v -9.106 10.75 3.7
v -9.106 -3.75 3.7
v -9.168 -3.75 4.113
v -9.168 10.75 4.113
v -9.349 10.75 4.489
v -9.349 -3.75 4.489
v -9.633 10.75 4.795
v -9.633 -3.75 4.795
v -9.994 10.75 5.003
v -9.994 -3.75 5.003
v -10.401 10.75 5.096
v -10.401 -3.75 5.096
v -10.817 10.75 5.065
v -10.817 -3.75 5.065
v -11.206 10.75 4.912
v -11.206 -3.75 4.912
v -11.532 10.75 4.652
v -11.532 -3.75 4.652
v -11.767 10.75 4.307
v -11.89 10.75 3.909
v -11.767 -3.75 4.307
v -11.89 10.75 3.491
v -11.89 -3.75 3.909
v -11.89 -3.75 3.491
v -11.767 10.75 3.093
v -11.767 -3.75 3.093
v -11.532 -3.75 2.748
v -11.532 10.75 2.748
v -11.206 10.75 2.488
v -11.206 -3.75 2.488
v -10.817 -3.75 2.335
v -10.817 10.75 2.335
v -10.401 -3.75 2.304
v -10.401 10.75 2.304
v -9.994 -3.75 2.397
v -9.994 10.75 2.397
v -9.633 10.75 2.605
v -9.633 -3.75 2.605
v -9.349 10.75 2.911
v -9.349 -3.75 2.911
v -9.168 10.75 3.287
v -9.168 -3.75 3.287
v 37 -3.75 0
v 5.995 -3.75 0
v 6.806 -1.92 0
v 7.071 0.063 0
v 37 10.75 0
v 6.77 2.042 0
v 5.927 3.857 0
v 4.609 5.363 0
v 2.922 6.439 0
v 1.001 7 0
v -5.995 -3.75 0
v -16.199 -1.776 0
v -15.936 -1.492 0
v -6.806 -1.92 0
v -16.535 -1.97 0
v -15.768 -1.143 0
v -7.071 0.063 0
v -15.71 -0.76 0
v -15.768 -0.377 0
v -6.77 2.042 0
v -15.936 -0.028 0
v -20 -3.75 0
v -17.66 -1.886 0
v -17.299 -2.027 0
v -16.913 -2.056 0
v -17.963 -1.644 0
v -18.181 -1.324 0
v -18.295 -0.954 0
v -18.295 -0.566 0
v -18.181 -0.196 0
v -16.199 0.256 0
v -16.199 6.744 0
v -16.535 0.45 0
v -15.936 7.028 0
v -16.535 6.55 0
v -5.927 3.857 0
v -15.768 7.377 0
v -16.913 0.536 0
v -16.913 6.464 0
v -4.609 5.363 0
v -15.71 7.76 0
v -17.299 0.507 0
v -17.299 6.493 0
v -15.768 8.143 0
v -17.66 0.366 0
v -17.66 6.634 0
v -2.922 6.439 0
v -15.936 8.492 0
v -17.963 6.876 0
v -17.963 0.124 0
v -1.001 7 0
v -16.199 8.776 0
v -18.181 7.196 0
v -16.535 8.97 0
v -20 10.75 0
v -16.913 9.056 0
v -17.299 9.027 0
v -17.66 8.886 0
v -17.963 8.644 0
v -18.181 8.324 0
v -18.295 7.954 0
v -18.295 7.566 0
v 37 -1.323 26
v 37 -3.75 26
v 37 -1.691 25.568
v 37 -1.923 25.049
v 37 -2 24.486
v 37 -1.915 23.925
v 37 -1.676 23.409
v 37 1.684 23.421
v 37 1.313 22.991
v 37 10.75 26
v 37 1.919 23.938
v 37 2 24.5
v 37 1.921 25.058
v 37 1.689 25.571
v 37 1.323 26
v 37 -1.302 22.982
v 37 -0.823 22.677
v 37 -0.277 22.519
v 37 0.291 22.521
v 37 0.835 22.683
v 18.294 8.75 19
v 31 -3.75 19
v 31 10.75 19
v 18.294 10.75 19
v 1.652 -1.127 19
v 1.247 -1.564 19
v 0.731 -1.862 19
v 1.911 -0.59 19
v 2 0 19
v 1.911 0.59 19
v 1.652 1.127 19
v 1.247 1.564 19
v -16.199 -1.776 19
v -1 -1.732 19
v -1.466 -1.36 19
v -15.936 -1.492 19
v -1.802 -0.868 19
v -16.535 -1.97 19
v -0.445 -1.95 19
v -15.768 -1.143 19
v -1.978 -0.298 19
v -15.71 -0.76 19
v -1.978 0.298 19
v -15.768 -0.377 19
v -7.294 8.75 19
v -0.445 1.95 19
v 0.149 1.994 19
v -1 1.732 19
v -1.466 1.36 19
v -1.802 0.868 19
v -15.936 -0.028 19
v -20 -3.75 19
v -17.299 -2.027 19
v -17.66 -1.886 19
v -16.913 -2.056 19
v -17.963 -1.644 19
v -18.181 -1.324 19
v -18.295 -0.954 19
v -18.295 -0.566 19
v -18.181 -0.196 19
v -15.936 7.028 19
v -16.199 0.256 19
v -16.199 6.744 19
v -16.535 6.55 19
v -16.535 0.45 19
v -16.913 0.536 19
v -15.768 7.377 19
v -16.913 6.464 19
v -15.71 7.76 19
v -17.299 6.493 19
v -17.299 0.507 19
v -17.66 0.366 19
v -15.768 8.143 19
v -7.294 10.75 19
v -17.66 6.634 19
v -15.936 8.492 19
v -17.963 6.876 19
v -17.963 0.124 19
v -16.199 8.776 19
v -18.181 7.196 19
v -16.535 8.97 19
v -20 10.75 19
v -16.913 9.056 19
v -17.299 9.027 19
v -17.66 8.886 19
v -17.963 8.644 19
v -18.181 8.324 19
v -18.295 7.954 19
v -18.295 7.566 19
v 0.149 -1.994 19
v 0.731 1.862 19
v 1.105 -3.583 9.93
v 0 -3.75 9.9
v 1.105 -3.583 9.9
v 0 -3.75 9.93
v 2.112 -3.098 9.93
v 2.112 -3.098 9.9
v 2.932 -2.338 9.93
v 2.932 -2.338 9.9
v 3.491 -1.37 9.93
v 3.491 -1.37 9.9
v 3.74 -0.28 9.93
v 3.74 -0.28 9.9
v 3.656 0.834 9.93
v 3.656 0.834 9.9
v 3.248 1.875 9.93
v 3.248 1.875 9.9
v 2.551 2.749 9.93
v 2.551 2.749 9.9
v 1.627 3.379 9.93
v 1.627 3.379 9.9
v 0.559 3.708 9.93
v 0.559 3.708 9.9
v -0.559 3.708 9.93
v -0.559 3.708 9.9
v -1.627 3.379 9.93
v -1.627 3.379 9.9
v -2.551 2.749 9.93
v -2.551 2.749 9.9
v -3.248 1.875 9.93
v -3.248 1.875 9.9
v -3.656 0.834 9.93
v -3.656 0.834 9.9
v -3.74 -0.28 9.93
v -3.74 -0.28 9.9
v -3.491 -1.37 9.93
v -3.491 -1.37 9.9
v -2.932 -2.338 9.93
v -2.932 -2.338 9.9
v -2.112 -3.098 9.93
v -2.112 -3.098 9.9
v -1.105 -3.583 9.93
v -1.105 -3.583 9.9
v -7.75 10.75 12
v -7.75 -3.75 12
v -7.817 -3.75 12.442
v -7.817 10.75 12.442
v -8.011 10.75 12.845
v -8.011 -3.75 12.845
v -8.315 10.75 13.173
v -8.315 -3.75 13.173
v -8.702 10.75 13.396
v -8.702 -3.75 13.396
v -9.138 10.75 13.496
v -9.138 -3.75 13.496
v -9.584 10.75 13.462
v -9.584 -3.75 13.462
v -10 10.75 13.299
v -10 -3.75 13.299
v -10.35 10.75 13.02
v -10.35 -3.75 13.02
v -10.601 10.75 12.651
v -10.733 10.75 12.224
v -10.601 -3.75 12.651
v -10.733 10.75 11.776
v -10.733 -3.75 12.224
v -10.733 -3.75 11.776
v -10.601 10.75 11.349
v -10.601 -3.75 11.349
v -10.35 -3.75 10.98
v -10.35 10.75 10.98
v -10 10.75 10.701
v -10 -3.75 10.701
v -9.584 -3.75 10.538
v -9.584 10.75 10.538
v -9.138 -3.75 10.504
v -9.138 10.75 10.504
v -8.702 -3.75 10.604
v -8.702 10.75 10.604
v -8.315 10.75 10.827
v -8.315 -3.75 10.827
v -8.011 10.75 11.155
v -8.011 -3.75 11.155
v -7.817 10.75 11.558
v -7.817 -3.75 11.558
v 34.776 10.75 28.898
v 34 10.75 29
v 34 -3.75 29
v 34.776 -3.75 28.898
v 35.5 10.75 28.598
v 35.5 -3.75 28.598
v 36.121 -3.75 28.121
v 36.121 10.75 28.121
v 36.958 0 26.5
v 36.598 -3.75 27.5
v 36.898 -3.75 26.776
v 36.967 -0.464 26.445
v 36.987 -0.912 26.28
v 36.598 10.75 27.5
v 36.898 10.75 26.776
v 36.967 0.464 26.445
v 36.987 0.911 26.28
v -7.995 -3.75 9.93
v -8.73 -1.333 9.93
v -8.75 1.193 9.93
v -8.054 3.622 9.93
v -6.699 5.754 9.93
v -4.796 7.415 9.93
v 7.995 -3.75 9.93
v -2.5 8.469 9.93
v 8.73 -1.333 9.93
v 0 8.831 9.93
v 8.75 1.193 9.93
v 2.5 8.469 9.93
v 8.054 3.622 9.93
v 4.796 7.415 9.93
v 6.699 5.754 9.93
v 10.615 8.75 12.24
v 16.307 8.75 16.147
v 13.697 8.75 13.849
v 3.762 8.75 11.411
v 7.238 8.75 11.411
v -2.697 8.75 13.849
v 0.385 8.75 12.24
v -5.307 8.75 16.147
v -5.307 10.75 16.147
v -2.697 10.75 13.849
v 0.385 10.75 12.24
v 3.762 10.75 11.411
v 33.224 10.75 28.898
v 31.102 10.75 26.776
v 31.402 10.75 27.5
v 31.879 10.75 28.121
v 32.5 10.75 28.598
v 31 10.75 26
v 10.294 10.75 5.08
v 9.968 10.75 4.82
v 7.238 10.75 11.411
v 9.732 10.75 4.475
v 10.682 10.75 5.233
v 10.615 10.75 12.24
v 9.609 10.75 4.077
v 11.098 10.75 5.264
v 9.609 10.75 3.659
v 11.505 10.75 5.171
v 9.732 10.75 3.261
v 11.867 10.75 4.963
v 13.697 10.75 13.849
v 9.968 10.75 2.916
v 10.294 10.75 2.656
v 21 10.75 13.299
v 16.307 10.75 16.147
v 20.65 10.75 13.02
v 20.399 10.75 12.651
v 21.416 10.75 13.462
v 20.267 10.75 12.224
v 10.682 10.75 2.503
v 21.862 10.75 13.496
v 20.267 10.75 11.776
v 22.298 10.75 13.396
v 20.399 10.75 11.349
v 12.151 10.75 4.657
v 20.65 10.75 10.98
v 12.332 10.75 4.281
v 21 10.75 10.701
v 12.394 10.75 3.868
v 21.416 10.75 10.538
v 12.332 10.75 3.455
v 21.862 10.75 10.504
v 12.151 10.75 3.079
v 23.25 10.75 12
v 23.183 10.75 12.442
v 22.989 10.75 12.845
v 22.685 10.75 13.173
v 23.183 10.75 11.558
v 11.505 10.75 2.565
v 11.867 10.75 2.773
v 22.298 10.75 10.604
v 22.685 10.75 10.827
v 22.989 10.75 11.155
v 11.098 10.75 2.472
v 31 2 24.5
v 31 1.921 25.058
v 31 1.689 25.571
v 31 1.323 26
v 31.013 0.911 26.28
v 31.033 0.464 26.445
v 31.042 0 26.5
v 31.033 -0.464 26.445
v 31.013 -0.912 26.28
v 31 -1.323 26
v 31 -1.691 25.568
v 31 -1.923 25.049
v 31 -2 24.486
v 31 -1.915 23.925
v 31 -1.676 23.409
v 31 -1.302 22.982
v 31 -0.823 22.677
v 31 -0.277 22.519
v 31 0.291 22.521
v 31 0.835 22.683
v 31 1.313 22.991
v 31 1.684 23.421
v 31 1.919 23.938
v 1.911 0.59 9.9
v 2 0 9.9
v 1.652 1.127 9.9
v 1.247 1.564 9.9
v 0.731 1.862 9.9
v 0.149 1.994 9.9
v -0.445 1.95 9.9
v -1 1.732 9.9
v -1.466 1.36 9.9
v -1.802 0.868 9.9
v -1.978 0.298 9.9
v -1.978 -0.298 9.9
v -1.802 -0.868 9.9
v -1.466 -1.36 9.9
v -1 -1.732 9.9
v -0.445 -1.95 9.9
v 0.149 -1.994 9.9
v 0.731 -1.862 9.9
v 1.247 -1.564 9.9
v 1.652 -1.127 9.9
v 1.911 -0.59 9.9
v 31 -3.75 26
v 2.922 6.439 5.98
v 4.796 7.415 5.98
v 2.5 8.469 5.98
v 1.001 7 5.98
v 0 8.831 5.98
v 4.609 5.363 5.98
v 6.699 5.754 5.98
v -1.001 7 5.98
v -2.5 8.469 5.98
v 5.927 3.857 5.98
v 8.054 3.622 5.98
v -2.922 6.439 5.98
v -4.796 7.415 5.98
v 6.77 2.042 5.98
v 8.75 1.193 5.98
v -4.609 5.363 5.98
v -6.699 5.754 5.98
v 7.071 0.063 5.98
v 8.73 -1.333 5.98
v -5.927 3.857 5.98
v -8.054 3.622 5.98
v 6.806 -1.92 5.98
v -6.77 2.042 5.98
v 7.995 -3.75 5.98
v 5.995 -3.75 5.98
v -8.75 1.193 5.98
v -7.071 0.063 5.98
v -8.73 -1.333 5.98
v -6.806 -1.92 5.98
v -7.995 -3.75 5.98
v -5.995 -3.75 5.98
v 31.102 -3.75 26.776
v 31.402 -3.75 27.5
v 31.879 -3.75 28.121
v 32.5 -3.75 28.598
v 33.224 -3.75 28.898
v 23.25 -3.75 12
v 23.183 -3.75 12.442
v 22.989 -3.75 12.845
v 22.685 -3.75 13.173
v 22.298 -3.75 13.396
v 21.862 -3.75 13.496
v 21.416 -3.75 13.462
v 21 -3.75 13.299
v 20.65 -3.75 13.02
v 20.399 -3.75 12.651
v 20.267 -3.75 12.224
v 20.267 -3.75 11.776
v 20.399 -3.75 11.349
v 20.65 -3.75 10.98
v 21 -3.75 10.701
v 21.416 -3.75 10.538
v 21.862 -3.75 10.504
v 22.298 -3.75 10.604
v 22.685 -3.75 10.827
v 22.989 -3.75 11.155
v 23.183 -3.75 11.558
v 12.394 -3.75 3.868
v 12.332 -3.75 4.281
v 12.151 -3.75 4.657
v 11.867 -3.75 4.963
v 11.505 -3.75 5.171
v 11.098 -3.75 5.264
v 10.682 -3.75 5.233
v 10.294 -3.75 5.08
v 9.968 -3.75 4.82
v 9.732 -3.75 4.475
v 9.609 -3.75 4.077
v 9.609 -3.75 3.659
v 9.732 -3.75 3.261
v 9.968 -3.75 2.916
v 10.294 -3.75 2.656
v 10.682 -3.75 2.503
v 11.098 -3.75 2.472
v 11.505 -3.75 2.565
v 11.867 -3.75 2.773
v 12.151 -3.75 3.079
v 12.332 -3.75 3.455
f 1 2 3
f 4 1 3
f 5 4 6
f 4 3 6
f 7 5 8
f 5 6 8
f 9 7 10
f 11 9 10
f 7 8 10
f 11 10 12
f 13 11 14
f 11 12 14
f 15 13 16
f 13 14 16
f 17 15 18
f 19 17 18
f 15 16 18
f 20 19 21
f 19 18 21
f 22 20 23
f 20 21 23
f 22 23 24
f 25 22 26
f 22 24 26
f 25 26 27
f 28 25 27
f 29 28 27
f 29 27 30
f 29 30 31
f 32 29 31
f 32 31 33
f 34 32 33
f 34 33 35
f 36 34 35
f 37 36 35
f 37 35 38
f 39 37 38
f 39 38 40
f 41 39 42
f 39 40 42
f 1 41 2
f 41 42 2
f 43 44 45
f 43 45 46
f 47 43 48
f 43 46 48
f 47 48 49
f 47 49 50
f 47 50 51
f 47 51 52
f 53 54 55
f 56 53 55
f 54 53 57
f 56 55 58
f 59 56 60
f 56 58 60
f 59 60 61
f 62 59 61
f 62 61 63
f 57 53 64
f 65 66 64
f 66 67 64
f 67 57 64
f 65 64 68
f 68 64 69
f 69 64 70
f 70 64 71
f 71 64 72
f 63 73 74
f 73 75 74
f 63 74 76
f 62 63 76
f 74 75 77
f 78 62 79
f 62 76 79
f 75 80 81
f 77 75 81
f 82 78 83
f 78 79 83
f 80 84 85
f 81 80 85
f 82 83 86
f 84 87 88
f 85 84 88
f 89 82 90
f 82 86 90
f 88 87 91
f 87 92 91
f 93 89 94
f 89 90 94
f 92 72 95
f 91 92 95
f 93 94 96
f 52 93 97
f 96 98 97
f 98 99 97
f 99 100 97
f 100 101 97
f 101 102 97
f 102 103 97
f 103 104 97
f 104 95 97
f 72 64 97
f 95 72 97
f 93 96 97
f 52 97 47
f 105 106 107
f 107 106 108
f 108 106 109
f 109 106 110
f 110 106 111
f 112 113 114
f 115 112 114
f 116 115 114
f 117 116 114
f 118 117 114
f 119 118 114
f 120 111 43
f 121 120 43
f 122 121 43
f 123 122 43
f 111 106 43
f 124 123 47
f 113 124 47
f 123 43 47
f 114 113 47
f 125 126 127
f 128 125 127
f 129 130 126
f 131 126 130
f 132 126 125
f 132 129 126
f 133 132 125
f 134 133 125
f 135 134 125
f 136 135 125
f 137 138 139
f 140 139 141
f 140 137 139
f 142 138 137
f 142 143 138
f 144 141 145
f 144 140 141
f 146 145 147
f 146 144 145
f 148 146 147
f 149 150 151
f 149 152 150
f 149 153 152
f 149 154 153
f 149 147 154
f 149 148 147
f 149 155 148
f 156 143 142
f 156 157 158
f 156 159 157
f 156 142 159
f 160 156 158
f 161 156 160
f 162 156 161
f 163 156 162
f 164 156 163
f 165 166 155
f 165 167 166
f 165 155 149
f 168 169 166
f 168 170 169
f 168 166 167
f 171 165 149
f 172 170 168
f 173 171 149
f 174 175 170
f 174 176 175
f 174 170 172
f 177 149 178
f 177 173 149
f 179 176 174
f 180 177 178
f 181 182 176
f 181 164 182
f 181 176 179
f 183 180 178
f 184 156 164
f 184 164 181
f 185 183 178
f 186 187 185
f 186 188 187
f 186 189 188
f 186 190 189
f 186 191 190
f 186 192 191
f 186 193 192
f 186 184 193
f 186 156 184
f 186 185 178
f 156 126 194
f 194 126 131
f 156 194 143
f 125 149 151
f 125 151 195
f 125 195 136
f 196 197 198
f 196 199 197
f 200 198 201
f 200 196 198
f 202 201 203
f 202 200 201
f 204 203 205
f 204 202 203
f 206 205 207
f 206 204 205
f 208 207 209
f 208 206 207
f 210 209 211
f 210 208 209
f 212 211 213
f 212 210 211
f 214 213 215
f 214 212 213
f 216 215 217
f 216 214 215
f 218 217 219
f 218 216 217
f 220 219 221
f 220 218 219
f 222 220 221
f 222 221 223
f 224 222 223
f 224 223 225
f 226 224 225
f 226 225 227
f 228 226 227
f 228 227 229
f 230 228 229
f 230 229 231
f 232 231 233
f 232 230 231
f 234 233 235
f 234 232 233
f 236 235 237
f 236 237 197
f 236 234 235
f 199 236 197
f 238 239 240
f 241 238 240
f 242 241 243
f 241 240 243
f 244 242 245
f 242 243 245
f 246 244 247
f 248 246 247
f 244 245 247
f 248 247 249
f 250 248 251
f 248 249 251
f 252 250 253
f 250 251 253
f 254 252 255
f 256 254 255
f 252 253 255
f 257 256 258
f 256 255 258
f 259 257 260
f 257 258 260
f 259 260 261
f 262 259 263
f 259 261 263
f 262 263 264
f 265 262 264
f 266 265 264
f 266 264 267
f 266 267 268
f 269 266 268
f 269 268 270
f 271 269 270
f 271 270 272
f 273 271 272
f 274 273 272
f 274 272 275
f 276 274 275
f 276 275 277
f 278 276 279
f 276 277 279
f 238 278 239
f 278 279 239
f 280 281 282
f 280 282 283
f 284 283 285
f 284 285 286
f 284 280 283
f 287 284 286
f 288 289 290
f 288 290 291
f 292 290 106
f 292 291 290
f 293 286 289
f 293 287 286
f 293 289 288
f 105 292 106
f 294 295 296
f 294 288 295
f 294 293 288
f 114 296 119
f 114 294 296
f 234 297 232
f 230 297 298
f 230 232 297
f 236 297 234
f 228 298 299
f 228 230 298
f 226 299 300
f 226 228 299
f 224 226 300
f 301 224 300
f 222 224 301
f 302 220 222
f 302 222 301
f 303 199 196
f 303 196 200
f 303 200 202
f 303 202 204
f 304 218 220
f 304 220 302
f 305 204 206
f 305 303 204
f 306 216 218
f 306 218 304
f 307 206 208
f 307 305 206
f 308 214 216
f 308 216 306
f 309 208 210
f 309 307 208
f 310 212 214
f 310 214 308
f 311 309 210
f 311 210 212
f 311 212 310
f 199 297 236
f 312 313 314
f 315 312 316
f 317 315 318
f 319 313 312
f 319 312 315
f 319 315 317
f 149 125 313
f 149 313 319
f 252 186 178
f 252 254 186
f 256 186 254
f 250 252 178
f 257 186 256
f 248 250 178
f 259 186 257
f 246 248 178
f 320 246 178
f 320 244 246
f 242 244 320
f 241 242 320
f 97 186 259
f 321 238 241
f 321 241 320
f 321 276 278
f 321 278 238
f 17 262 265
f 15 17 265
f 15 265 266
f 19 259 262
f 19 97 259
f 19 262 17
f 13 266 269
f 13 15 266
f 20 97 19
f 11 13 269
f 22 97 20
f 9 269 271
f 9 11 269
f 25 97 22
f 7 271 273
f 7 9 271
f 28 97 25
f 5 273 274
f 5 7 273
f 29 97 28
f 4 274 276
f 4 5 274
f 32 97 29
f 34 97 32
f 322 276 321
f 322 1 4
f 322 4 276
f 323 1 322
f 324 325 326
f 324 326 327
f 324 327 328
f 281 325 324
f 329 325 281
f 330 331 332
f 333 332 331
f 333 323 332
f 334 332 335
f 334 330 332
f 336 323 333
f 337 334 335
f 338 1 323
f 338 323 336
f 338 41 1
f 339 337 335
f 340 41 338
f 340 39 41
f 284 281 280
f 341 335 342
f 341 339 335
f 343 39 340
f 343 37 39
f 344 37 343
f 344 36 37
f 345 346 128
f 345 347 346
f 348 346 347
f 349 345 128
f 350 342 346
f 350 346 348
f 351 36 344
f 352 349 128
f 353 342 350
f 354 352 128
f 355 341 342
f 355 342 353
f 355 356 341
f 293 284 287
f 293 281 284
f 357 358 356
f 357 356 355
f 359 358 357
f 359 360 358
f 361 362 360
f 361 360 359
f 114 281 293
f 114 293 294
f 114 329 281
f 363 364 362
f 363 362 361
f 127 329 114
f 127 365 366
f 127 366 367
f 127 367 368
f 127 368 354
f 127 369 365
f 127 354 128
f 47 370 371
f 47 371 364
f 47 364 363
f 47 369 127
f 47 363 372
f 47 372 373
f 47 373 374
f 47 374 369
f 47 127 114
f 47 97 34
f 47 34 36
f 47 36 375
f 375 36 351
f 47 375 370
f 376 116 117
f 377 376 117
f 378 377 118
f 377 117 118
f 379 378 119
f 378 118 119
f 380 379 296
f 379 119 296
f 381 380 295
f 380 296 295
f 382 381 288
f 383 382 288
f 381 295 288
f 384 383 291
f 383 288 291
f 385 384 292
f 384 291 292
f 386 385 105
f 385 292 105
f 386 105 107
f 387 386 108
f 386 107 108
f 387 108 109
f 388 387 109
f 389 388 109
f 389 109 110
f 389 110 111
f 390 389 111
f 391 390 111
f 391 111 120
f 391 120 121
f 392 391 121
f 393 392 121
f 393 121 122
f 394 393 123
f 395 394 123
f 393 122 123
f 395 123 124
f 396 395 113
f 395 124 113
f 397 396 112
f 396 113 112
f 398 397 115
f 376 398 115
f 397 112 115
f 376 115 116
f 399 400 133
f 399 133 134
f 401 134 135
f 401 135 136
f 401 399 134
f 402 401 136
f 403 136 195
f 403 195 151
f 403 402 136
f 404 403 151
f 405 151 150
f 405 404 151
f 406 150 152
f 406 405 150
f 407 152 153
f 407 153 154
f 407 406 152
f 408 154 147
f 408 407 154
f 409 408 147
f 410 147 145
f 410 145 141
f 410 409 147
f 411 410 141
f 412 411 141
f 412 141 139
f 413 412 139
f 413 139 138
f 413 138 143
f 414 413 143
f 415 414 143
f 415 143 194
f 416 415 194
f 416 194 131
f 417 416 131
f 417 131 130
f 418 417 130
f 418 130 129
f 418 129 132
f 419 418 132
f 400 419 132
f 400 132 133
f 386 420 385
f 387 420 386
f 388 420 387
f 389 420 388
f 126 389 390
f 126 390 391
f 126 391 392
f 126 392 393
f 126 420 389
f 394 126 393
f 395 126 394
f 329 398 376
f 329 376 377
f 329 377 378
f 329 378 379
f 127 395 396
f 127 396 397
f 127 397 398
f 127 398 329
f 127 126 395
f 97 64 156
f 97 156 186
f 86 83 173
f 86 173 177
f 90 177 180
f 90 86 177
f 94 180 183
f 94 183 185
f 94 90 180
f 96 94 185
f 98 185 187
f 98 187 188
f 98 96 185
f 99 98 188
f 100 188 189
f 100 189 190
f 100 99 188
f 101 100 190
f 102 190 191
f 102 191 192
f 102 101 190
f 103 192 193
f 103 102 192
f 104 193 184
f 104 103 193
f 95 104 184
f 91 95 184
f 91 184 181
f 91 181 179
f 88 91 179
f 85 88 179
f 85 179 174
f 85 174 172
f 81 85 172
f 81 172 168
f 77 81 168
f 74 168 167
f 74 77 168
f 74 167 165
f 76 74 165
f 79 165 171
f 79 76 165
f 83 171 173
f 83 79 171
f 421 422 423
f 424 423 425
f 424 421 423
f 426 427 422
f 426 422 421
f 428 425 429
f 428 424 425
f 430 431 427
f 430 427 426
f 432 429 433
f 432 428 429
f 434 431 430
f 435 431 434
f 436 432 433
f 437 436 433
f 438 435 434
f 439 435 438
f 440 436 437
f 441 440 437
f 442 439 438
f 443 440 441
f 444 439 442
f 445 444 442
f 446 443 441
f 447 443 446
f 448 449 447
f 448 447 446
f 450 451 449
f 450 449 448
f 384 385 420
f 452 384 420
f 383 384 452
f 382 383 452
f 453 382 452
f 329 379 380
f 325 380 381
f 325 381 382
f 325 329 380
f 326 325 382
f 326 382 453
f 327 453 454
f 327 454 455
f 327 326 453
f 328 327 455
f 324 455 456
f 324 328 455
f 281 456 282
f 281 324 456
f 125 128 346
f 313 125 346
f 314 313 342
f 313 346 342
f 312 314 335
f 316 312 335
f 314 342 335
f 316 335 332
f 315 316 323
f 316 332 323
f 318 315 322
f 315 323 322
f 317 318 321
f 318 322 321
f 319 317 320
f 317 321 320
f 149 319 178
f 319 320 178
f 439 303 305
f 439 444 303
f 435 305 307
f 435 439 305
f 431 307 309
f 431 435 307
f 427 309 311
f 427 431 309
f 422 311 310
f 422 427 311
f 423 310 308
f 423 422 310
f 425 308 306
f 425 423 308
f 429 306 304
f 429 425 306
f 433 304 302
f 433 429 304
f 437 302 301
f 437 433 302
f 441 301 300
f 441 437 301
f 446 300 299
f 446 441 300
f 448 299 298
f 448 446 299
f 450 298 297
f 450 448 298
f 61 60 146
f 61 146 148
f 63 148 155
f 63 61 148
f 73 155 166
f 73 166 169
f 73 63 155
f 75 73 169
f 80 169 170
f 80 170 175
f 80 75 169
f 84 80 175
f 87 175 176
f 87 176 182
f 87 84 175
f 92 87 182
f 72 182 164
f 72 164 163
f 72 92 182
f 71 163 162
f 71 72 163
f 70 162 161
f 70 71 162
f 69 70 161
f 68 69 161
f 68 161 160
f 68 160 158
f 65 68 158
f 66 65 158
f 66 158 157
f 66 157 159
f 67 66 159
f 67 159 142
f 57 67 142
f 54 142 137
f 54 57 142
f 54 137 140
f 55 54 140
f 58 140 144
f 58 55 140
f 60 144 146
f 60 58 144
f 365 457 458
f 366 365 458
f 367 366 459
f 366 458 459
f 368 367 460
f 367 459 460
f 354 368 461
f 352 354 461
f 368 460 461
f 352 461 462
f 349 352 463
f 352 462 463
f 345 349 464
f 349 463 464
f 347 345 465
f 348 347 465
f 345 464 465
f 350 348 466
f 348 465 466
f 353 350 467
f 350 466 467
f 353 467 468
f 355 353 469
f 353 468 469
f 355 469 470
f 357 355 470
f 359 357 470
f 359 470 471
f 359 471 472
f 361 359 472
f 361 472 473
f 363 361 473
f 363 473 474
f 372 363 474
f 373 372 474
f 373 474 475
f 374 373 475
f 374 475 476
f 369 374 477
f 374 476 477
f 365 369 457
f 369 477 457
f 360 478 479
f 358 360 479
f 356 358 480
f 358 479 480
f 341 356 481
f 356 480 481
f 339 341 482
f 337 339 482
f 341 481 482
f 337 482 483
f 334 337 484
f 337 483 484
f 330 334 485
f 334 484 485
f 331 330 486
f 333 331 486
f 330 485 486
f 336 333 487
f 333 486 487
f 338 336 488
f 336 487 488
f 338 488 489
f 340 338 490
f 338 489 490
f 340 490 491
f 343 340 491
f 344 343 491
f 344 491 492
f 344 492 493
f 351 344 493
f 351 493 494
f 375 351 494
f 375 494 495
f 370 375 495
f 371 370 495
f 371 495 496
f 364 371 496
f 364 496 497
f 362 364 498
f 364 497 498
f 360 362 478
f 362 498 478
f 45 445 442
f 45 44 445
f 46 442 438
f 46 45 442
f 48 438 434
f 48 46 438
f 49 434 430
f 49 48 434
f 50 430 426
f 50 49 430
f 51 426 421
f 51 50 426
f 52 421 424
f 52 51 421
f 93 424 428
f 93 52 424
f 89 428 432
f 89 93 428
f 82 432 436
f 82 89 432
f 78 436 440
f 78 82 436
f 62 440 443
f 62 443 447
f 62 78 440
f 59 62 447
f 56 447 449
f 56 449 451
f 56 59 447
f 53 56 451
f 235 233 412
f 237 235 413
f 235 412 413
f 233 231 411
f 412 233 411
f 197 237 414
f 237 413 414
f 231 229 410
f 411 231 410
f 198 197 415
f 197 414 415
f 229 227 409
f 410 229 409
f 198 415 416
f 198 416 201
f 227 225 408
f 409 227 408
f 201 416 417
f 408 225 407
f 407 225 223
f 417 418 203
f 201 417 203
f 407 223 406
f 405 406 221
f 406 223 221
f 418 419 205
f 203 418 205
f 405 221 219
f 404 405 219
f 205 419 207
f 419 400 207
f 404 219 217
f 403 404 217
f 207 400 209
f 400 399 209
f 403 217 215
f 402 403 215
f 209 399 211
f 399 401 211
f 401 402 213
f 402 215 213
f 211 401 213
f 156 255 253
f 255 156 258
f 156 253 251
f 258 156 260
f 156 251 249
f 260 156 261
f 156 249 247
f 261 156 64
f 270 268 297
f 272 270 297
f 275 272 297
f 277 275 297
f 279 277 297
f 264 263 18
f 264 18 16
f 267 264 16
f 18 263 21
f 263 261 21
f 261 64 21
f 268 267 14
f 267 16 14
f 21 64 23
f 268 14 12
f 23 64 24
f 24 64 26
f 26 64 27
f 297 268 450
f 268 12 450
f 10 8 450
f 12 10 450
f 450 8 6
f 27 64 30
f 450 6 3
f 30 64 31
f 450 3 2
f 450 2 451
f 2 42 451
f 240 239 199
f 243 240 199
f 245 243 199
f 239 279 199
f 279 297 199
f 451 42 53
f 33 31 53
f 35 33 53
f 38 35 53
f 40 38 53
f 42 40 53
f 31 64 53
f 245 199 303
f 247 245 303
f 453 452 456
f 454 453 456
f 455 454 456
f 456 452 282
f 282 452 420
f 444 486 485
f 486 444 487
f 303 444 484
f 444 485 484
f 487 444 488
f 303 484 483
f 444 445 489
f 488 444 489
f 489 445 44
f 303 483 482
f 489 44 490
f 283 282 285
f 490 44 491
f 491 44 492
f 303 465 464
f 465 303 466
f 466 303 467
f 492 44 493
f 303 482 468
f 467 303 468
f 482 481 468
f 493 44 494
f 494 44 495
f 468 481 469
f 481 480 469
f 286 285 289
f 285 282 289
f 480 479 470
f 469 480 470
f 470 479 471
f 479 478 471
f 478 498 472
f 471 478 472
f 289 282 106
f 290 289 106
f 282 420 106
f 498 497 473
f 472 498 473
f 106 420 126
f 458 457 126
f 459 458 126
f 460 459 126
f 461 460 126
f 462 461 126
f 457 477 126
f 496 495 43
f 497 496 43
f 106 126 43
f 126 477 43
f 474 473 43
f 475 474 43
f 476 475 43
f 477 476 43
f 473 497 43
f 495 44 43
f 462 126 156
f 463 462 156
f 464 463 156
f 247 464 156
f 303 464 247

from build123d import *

# Parameters (mm, degrees)
F0_W         = 47
F0_H         = 14.5
F0_R         = 1.3
F0_R_2       = 2
F1_DEPTH     = 19
F4_DEPTH     = 9.9
F5_R         = 1.5
F5_R_2       = 1.4
F6_DEPTH     = 14.5
F7_DEPTH     = 10
F8_W         = 6
F8_H         = 14.5
F9_DEPTH     = 10
F10_R        = 2
F11_DEPTH    = 6
F12_T1_DEPTH = 29.5
F14_DEPTH    = 2


# Not quite as in the source:
# - a fillet or chamfer that OpenCascade refuses, or shapes differently, is made with other operations: its cross-section is extruded or revolved along the edge and cut away or added


with BuildPart() as f1:
    # F0 (on Top) → F1 (new body)
    with BuildSketch(Plane.XY):
        with Locations((3.5, 3.5)):
            Rectangle(F0_W, F0_H)
        with Locations((-17.01, -0.76)):
            Circle(F0_R, mode=Mode.SUBTRACT)
        Circle(F0_R_2, mode=Mode.SUBTRACT)
        with Locations((-17.01, 7.76)):
            Circle(F0_R, mode=Mode.SUBTRACT)
    extrude(amount=F1_DEPTH)

    # F2 (on face) → F3 (revolve, cut)
    with BuildSketch(Plane.XZ.offset(3.75)):
        Polygon((0, 9.93), (-7.995, 9.93), (-7.995, 5.98), (-5.995, 5.98), (-5.995, 0), (0, 0), align=None)
    revolve(axis=Axis((0, 0, 0), (0, 0, 1)), mode=Mode.SUBTRACT)

    # F4 (cut): a face of the model
    f4_faces = [f1.faces().sort_by_distance(p)[0] for p in [
        (0, 3.6439339828, 0),
    ]]
    extrude(f4_faces, amount=-F4_DEPTH, mode=Mode.SUBTRACT)

    # F5 (on face) → F6 (cut, through all)
    with BuildSketch(Plane.XZ.offset(3.75)):
        with Locations((-9.25, 12)):
            Circle(F5_R)
        with Locations((-10.5055273842, 3.7)):
            Circle(F5_R_2)
        with Locations((10.9938158954, 3.8680432901)):
            Circle(F5_R_2)
        with Locations((21.75, 12)):
            Circle(F5_R)
    extrude(amount=-F6_DEPTH, mode=Mode.SUBTRACT)

    # F7 (add): a face of the model
    f7_faces = [f1.faces().sort_by_distance(p)[0] for p in [
        (27, 3.5, 9.5),
    ]]
    extrude(f7_faces, amount=F7_DEPTH)

    # F8 (on face) → F9 (join)
    with BuildSketch(Plane.XY.offset(19)):
        with Locations((34, 3.5)):
            Rectangle(F8_W, F8_H)
    extrude(amount=F9_DEPTH)

    # F10 (on face) → F11 (cut, through all)
    with BuildSketch(Plane.YZ.offset(37)):
        with Locations((0, 24.5)):
            Circle(F10_R)
    extrude(amount=-F11_DEPTH, mode=Mode.SUBTRACT)

    # F12: fillet of radius 3 on 2 edges, made by hand

    # F12_s2 → F12_t1 (cut)
    with BuildSketch(Plane.XZ.offset(-18.25)):
        with BuildLine():
            ThreePointArc((31, 26), (31.8786796564, 28.1213203436), (34, 29))
            Line((34, 29), (31, 29))
            Line((31, 29), (31, 26))
        make_face()
        with BuildLine():
            ThreePointArc((34, 29), (36.1213203436, 28.1213203436), (37, 26))
            Line((37, 26), (37, 29))
            Line((37, 29), (34, 29))
        make_face()
    extrude(amount=F12_T1_DEPTH, mode=Mode.SUBTRACT)

    # F13 (on face) → F14 (cut)
    with BuildSketch(Plane(origin=(0, 10.75, 0), x_dir=(-1, 0, 0), z_dir=(0, 1, 0))):
        with BuildLine():
            Line((7.2936857888, 19), (-18.2936857888, 19))
            ThreePointArc((-18.2936857888, 19), (-5.5, 11.3063278591), (7.2936857888, 19))
        make_face()
    extrude(amount=-F14_DEPTH, mode=Mode.SUBTRACT)


solid = f1.part
